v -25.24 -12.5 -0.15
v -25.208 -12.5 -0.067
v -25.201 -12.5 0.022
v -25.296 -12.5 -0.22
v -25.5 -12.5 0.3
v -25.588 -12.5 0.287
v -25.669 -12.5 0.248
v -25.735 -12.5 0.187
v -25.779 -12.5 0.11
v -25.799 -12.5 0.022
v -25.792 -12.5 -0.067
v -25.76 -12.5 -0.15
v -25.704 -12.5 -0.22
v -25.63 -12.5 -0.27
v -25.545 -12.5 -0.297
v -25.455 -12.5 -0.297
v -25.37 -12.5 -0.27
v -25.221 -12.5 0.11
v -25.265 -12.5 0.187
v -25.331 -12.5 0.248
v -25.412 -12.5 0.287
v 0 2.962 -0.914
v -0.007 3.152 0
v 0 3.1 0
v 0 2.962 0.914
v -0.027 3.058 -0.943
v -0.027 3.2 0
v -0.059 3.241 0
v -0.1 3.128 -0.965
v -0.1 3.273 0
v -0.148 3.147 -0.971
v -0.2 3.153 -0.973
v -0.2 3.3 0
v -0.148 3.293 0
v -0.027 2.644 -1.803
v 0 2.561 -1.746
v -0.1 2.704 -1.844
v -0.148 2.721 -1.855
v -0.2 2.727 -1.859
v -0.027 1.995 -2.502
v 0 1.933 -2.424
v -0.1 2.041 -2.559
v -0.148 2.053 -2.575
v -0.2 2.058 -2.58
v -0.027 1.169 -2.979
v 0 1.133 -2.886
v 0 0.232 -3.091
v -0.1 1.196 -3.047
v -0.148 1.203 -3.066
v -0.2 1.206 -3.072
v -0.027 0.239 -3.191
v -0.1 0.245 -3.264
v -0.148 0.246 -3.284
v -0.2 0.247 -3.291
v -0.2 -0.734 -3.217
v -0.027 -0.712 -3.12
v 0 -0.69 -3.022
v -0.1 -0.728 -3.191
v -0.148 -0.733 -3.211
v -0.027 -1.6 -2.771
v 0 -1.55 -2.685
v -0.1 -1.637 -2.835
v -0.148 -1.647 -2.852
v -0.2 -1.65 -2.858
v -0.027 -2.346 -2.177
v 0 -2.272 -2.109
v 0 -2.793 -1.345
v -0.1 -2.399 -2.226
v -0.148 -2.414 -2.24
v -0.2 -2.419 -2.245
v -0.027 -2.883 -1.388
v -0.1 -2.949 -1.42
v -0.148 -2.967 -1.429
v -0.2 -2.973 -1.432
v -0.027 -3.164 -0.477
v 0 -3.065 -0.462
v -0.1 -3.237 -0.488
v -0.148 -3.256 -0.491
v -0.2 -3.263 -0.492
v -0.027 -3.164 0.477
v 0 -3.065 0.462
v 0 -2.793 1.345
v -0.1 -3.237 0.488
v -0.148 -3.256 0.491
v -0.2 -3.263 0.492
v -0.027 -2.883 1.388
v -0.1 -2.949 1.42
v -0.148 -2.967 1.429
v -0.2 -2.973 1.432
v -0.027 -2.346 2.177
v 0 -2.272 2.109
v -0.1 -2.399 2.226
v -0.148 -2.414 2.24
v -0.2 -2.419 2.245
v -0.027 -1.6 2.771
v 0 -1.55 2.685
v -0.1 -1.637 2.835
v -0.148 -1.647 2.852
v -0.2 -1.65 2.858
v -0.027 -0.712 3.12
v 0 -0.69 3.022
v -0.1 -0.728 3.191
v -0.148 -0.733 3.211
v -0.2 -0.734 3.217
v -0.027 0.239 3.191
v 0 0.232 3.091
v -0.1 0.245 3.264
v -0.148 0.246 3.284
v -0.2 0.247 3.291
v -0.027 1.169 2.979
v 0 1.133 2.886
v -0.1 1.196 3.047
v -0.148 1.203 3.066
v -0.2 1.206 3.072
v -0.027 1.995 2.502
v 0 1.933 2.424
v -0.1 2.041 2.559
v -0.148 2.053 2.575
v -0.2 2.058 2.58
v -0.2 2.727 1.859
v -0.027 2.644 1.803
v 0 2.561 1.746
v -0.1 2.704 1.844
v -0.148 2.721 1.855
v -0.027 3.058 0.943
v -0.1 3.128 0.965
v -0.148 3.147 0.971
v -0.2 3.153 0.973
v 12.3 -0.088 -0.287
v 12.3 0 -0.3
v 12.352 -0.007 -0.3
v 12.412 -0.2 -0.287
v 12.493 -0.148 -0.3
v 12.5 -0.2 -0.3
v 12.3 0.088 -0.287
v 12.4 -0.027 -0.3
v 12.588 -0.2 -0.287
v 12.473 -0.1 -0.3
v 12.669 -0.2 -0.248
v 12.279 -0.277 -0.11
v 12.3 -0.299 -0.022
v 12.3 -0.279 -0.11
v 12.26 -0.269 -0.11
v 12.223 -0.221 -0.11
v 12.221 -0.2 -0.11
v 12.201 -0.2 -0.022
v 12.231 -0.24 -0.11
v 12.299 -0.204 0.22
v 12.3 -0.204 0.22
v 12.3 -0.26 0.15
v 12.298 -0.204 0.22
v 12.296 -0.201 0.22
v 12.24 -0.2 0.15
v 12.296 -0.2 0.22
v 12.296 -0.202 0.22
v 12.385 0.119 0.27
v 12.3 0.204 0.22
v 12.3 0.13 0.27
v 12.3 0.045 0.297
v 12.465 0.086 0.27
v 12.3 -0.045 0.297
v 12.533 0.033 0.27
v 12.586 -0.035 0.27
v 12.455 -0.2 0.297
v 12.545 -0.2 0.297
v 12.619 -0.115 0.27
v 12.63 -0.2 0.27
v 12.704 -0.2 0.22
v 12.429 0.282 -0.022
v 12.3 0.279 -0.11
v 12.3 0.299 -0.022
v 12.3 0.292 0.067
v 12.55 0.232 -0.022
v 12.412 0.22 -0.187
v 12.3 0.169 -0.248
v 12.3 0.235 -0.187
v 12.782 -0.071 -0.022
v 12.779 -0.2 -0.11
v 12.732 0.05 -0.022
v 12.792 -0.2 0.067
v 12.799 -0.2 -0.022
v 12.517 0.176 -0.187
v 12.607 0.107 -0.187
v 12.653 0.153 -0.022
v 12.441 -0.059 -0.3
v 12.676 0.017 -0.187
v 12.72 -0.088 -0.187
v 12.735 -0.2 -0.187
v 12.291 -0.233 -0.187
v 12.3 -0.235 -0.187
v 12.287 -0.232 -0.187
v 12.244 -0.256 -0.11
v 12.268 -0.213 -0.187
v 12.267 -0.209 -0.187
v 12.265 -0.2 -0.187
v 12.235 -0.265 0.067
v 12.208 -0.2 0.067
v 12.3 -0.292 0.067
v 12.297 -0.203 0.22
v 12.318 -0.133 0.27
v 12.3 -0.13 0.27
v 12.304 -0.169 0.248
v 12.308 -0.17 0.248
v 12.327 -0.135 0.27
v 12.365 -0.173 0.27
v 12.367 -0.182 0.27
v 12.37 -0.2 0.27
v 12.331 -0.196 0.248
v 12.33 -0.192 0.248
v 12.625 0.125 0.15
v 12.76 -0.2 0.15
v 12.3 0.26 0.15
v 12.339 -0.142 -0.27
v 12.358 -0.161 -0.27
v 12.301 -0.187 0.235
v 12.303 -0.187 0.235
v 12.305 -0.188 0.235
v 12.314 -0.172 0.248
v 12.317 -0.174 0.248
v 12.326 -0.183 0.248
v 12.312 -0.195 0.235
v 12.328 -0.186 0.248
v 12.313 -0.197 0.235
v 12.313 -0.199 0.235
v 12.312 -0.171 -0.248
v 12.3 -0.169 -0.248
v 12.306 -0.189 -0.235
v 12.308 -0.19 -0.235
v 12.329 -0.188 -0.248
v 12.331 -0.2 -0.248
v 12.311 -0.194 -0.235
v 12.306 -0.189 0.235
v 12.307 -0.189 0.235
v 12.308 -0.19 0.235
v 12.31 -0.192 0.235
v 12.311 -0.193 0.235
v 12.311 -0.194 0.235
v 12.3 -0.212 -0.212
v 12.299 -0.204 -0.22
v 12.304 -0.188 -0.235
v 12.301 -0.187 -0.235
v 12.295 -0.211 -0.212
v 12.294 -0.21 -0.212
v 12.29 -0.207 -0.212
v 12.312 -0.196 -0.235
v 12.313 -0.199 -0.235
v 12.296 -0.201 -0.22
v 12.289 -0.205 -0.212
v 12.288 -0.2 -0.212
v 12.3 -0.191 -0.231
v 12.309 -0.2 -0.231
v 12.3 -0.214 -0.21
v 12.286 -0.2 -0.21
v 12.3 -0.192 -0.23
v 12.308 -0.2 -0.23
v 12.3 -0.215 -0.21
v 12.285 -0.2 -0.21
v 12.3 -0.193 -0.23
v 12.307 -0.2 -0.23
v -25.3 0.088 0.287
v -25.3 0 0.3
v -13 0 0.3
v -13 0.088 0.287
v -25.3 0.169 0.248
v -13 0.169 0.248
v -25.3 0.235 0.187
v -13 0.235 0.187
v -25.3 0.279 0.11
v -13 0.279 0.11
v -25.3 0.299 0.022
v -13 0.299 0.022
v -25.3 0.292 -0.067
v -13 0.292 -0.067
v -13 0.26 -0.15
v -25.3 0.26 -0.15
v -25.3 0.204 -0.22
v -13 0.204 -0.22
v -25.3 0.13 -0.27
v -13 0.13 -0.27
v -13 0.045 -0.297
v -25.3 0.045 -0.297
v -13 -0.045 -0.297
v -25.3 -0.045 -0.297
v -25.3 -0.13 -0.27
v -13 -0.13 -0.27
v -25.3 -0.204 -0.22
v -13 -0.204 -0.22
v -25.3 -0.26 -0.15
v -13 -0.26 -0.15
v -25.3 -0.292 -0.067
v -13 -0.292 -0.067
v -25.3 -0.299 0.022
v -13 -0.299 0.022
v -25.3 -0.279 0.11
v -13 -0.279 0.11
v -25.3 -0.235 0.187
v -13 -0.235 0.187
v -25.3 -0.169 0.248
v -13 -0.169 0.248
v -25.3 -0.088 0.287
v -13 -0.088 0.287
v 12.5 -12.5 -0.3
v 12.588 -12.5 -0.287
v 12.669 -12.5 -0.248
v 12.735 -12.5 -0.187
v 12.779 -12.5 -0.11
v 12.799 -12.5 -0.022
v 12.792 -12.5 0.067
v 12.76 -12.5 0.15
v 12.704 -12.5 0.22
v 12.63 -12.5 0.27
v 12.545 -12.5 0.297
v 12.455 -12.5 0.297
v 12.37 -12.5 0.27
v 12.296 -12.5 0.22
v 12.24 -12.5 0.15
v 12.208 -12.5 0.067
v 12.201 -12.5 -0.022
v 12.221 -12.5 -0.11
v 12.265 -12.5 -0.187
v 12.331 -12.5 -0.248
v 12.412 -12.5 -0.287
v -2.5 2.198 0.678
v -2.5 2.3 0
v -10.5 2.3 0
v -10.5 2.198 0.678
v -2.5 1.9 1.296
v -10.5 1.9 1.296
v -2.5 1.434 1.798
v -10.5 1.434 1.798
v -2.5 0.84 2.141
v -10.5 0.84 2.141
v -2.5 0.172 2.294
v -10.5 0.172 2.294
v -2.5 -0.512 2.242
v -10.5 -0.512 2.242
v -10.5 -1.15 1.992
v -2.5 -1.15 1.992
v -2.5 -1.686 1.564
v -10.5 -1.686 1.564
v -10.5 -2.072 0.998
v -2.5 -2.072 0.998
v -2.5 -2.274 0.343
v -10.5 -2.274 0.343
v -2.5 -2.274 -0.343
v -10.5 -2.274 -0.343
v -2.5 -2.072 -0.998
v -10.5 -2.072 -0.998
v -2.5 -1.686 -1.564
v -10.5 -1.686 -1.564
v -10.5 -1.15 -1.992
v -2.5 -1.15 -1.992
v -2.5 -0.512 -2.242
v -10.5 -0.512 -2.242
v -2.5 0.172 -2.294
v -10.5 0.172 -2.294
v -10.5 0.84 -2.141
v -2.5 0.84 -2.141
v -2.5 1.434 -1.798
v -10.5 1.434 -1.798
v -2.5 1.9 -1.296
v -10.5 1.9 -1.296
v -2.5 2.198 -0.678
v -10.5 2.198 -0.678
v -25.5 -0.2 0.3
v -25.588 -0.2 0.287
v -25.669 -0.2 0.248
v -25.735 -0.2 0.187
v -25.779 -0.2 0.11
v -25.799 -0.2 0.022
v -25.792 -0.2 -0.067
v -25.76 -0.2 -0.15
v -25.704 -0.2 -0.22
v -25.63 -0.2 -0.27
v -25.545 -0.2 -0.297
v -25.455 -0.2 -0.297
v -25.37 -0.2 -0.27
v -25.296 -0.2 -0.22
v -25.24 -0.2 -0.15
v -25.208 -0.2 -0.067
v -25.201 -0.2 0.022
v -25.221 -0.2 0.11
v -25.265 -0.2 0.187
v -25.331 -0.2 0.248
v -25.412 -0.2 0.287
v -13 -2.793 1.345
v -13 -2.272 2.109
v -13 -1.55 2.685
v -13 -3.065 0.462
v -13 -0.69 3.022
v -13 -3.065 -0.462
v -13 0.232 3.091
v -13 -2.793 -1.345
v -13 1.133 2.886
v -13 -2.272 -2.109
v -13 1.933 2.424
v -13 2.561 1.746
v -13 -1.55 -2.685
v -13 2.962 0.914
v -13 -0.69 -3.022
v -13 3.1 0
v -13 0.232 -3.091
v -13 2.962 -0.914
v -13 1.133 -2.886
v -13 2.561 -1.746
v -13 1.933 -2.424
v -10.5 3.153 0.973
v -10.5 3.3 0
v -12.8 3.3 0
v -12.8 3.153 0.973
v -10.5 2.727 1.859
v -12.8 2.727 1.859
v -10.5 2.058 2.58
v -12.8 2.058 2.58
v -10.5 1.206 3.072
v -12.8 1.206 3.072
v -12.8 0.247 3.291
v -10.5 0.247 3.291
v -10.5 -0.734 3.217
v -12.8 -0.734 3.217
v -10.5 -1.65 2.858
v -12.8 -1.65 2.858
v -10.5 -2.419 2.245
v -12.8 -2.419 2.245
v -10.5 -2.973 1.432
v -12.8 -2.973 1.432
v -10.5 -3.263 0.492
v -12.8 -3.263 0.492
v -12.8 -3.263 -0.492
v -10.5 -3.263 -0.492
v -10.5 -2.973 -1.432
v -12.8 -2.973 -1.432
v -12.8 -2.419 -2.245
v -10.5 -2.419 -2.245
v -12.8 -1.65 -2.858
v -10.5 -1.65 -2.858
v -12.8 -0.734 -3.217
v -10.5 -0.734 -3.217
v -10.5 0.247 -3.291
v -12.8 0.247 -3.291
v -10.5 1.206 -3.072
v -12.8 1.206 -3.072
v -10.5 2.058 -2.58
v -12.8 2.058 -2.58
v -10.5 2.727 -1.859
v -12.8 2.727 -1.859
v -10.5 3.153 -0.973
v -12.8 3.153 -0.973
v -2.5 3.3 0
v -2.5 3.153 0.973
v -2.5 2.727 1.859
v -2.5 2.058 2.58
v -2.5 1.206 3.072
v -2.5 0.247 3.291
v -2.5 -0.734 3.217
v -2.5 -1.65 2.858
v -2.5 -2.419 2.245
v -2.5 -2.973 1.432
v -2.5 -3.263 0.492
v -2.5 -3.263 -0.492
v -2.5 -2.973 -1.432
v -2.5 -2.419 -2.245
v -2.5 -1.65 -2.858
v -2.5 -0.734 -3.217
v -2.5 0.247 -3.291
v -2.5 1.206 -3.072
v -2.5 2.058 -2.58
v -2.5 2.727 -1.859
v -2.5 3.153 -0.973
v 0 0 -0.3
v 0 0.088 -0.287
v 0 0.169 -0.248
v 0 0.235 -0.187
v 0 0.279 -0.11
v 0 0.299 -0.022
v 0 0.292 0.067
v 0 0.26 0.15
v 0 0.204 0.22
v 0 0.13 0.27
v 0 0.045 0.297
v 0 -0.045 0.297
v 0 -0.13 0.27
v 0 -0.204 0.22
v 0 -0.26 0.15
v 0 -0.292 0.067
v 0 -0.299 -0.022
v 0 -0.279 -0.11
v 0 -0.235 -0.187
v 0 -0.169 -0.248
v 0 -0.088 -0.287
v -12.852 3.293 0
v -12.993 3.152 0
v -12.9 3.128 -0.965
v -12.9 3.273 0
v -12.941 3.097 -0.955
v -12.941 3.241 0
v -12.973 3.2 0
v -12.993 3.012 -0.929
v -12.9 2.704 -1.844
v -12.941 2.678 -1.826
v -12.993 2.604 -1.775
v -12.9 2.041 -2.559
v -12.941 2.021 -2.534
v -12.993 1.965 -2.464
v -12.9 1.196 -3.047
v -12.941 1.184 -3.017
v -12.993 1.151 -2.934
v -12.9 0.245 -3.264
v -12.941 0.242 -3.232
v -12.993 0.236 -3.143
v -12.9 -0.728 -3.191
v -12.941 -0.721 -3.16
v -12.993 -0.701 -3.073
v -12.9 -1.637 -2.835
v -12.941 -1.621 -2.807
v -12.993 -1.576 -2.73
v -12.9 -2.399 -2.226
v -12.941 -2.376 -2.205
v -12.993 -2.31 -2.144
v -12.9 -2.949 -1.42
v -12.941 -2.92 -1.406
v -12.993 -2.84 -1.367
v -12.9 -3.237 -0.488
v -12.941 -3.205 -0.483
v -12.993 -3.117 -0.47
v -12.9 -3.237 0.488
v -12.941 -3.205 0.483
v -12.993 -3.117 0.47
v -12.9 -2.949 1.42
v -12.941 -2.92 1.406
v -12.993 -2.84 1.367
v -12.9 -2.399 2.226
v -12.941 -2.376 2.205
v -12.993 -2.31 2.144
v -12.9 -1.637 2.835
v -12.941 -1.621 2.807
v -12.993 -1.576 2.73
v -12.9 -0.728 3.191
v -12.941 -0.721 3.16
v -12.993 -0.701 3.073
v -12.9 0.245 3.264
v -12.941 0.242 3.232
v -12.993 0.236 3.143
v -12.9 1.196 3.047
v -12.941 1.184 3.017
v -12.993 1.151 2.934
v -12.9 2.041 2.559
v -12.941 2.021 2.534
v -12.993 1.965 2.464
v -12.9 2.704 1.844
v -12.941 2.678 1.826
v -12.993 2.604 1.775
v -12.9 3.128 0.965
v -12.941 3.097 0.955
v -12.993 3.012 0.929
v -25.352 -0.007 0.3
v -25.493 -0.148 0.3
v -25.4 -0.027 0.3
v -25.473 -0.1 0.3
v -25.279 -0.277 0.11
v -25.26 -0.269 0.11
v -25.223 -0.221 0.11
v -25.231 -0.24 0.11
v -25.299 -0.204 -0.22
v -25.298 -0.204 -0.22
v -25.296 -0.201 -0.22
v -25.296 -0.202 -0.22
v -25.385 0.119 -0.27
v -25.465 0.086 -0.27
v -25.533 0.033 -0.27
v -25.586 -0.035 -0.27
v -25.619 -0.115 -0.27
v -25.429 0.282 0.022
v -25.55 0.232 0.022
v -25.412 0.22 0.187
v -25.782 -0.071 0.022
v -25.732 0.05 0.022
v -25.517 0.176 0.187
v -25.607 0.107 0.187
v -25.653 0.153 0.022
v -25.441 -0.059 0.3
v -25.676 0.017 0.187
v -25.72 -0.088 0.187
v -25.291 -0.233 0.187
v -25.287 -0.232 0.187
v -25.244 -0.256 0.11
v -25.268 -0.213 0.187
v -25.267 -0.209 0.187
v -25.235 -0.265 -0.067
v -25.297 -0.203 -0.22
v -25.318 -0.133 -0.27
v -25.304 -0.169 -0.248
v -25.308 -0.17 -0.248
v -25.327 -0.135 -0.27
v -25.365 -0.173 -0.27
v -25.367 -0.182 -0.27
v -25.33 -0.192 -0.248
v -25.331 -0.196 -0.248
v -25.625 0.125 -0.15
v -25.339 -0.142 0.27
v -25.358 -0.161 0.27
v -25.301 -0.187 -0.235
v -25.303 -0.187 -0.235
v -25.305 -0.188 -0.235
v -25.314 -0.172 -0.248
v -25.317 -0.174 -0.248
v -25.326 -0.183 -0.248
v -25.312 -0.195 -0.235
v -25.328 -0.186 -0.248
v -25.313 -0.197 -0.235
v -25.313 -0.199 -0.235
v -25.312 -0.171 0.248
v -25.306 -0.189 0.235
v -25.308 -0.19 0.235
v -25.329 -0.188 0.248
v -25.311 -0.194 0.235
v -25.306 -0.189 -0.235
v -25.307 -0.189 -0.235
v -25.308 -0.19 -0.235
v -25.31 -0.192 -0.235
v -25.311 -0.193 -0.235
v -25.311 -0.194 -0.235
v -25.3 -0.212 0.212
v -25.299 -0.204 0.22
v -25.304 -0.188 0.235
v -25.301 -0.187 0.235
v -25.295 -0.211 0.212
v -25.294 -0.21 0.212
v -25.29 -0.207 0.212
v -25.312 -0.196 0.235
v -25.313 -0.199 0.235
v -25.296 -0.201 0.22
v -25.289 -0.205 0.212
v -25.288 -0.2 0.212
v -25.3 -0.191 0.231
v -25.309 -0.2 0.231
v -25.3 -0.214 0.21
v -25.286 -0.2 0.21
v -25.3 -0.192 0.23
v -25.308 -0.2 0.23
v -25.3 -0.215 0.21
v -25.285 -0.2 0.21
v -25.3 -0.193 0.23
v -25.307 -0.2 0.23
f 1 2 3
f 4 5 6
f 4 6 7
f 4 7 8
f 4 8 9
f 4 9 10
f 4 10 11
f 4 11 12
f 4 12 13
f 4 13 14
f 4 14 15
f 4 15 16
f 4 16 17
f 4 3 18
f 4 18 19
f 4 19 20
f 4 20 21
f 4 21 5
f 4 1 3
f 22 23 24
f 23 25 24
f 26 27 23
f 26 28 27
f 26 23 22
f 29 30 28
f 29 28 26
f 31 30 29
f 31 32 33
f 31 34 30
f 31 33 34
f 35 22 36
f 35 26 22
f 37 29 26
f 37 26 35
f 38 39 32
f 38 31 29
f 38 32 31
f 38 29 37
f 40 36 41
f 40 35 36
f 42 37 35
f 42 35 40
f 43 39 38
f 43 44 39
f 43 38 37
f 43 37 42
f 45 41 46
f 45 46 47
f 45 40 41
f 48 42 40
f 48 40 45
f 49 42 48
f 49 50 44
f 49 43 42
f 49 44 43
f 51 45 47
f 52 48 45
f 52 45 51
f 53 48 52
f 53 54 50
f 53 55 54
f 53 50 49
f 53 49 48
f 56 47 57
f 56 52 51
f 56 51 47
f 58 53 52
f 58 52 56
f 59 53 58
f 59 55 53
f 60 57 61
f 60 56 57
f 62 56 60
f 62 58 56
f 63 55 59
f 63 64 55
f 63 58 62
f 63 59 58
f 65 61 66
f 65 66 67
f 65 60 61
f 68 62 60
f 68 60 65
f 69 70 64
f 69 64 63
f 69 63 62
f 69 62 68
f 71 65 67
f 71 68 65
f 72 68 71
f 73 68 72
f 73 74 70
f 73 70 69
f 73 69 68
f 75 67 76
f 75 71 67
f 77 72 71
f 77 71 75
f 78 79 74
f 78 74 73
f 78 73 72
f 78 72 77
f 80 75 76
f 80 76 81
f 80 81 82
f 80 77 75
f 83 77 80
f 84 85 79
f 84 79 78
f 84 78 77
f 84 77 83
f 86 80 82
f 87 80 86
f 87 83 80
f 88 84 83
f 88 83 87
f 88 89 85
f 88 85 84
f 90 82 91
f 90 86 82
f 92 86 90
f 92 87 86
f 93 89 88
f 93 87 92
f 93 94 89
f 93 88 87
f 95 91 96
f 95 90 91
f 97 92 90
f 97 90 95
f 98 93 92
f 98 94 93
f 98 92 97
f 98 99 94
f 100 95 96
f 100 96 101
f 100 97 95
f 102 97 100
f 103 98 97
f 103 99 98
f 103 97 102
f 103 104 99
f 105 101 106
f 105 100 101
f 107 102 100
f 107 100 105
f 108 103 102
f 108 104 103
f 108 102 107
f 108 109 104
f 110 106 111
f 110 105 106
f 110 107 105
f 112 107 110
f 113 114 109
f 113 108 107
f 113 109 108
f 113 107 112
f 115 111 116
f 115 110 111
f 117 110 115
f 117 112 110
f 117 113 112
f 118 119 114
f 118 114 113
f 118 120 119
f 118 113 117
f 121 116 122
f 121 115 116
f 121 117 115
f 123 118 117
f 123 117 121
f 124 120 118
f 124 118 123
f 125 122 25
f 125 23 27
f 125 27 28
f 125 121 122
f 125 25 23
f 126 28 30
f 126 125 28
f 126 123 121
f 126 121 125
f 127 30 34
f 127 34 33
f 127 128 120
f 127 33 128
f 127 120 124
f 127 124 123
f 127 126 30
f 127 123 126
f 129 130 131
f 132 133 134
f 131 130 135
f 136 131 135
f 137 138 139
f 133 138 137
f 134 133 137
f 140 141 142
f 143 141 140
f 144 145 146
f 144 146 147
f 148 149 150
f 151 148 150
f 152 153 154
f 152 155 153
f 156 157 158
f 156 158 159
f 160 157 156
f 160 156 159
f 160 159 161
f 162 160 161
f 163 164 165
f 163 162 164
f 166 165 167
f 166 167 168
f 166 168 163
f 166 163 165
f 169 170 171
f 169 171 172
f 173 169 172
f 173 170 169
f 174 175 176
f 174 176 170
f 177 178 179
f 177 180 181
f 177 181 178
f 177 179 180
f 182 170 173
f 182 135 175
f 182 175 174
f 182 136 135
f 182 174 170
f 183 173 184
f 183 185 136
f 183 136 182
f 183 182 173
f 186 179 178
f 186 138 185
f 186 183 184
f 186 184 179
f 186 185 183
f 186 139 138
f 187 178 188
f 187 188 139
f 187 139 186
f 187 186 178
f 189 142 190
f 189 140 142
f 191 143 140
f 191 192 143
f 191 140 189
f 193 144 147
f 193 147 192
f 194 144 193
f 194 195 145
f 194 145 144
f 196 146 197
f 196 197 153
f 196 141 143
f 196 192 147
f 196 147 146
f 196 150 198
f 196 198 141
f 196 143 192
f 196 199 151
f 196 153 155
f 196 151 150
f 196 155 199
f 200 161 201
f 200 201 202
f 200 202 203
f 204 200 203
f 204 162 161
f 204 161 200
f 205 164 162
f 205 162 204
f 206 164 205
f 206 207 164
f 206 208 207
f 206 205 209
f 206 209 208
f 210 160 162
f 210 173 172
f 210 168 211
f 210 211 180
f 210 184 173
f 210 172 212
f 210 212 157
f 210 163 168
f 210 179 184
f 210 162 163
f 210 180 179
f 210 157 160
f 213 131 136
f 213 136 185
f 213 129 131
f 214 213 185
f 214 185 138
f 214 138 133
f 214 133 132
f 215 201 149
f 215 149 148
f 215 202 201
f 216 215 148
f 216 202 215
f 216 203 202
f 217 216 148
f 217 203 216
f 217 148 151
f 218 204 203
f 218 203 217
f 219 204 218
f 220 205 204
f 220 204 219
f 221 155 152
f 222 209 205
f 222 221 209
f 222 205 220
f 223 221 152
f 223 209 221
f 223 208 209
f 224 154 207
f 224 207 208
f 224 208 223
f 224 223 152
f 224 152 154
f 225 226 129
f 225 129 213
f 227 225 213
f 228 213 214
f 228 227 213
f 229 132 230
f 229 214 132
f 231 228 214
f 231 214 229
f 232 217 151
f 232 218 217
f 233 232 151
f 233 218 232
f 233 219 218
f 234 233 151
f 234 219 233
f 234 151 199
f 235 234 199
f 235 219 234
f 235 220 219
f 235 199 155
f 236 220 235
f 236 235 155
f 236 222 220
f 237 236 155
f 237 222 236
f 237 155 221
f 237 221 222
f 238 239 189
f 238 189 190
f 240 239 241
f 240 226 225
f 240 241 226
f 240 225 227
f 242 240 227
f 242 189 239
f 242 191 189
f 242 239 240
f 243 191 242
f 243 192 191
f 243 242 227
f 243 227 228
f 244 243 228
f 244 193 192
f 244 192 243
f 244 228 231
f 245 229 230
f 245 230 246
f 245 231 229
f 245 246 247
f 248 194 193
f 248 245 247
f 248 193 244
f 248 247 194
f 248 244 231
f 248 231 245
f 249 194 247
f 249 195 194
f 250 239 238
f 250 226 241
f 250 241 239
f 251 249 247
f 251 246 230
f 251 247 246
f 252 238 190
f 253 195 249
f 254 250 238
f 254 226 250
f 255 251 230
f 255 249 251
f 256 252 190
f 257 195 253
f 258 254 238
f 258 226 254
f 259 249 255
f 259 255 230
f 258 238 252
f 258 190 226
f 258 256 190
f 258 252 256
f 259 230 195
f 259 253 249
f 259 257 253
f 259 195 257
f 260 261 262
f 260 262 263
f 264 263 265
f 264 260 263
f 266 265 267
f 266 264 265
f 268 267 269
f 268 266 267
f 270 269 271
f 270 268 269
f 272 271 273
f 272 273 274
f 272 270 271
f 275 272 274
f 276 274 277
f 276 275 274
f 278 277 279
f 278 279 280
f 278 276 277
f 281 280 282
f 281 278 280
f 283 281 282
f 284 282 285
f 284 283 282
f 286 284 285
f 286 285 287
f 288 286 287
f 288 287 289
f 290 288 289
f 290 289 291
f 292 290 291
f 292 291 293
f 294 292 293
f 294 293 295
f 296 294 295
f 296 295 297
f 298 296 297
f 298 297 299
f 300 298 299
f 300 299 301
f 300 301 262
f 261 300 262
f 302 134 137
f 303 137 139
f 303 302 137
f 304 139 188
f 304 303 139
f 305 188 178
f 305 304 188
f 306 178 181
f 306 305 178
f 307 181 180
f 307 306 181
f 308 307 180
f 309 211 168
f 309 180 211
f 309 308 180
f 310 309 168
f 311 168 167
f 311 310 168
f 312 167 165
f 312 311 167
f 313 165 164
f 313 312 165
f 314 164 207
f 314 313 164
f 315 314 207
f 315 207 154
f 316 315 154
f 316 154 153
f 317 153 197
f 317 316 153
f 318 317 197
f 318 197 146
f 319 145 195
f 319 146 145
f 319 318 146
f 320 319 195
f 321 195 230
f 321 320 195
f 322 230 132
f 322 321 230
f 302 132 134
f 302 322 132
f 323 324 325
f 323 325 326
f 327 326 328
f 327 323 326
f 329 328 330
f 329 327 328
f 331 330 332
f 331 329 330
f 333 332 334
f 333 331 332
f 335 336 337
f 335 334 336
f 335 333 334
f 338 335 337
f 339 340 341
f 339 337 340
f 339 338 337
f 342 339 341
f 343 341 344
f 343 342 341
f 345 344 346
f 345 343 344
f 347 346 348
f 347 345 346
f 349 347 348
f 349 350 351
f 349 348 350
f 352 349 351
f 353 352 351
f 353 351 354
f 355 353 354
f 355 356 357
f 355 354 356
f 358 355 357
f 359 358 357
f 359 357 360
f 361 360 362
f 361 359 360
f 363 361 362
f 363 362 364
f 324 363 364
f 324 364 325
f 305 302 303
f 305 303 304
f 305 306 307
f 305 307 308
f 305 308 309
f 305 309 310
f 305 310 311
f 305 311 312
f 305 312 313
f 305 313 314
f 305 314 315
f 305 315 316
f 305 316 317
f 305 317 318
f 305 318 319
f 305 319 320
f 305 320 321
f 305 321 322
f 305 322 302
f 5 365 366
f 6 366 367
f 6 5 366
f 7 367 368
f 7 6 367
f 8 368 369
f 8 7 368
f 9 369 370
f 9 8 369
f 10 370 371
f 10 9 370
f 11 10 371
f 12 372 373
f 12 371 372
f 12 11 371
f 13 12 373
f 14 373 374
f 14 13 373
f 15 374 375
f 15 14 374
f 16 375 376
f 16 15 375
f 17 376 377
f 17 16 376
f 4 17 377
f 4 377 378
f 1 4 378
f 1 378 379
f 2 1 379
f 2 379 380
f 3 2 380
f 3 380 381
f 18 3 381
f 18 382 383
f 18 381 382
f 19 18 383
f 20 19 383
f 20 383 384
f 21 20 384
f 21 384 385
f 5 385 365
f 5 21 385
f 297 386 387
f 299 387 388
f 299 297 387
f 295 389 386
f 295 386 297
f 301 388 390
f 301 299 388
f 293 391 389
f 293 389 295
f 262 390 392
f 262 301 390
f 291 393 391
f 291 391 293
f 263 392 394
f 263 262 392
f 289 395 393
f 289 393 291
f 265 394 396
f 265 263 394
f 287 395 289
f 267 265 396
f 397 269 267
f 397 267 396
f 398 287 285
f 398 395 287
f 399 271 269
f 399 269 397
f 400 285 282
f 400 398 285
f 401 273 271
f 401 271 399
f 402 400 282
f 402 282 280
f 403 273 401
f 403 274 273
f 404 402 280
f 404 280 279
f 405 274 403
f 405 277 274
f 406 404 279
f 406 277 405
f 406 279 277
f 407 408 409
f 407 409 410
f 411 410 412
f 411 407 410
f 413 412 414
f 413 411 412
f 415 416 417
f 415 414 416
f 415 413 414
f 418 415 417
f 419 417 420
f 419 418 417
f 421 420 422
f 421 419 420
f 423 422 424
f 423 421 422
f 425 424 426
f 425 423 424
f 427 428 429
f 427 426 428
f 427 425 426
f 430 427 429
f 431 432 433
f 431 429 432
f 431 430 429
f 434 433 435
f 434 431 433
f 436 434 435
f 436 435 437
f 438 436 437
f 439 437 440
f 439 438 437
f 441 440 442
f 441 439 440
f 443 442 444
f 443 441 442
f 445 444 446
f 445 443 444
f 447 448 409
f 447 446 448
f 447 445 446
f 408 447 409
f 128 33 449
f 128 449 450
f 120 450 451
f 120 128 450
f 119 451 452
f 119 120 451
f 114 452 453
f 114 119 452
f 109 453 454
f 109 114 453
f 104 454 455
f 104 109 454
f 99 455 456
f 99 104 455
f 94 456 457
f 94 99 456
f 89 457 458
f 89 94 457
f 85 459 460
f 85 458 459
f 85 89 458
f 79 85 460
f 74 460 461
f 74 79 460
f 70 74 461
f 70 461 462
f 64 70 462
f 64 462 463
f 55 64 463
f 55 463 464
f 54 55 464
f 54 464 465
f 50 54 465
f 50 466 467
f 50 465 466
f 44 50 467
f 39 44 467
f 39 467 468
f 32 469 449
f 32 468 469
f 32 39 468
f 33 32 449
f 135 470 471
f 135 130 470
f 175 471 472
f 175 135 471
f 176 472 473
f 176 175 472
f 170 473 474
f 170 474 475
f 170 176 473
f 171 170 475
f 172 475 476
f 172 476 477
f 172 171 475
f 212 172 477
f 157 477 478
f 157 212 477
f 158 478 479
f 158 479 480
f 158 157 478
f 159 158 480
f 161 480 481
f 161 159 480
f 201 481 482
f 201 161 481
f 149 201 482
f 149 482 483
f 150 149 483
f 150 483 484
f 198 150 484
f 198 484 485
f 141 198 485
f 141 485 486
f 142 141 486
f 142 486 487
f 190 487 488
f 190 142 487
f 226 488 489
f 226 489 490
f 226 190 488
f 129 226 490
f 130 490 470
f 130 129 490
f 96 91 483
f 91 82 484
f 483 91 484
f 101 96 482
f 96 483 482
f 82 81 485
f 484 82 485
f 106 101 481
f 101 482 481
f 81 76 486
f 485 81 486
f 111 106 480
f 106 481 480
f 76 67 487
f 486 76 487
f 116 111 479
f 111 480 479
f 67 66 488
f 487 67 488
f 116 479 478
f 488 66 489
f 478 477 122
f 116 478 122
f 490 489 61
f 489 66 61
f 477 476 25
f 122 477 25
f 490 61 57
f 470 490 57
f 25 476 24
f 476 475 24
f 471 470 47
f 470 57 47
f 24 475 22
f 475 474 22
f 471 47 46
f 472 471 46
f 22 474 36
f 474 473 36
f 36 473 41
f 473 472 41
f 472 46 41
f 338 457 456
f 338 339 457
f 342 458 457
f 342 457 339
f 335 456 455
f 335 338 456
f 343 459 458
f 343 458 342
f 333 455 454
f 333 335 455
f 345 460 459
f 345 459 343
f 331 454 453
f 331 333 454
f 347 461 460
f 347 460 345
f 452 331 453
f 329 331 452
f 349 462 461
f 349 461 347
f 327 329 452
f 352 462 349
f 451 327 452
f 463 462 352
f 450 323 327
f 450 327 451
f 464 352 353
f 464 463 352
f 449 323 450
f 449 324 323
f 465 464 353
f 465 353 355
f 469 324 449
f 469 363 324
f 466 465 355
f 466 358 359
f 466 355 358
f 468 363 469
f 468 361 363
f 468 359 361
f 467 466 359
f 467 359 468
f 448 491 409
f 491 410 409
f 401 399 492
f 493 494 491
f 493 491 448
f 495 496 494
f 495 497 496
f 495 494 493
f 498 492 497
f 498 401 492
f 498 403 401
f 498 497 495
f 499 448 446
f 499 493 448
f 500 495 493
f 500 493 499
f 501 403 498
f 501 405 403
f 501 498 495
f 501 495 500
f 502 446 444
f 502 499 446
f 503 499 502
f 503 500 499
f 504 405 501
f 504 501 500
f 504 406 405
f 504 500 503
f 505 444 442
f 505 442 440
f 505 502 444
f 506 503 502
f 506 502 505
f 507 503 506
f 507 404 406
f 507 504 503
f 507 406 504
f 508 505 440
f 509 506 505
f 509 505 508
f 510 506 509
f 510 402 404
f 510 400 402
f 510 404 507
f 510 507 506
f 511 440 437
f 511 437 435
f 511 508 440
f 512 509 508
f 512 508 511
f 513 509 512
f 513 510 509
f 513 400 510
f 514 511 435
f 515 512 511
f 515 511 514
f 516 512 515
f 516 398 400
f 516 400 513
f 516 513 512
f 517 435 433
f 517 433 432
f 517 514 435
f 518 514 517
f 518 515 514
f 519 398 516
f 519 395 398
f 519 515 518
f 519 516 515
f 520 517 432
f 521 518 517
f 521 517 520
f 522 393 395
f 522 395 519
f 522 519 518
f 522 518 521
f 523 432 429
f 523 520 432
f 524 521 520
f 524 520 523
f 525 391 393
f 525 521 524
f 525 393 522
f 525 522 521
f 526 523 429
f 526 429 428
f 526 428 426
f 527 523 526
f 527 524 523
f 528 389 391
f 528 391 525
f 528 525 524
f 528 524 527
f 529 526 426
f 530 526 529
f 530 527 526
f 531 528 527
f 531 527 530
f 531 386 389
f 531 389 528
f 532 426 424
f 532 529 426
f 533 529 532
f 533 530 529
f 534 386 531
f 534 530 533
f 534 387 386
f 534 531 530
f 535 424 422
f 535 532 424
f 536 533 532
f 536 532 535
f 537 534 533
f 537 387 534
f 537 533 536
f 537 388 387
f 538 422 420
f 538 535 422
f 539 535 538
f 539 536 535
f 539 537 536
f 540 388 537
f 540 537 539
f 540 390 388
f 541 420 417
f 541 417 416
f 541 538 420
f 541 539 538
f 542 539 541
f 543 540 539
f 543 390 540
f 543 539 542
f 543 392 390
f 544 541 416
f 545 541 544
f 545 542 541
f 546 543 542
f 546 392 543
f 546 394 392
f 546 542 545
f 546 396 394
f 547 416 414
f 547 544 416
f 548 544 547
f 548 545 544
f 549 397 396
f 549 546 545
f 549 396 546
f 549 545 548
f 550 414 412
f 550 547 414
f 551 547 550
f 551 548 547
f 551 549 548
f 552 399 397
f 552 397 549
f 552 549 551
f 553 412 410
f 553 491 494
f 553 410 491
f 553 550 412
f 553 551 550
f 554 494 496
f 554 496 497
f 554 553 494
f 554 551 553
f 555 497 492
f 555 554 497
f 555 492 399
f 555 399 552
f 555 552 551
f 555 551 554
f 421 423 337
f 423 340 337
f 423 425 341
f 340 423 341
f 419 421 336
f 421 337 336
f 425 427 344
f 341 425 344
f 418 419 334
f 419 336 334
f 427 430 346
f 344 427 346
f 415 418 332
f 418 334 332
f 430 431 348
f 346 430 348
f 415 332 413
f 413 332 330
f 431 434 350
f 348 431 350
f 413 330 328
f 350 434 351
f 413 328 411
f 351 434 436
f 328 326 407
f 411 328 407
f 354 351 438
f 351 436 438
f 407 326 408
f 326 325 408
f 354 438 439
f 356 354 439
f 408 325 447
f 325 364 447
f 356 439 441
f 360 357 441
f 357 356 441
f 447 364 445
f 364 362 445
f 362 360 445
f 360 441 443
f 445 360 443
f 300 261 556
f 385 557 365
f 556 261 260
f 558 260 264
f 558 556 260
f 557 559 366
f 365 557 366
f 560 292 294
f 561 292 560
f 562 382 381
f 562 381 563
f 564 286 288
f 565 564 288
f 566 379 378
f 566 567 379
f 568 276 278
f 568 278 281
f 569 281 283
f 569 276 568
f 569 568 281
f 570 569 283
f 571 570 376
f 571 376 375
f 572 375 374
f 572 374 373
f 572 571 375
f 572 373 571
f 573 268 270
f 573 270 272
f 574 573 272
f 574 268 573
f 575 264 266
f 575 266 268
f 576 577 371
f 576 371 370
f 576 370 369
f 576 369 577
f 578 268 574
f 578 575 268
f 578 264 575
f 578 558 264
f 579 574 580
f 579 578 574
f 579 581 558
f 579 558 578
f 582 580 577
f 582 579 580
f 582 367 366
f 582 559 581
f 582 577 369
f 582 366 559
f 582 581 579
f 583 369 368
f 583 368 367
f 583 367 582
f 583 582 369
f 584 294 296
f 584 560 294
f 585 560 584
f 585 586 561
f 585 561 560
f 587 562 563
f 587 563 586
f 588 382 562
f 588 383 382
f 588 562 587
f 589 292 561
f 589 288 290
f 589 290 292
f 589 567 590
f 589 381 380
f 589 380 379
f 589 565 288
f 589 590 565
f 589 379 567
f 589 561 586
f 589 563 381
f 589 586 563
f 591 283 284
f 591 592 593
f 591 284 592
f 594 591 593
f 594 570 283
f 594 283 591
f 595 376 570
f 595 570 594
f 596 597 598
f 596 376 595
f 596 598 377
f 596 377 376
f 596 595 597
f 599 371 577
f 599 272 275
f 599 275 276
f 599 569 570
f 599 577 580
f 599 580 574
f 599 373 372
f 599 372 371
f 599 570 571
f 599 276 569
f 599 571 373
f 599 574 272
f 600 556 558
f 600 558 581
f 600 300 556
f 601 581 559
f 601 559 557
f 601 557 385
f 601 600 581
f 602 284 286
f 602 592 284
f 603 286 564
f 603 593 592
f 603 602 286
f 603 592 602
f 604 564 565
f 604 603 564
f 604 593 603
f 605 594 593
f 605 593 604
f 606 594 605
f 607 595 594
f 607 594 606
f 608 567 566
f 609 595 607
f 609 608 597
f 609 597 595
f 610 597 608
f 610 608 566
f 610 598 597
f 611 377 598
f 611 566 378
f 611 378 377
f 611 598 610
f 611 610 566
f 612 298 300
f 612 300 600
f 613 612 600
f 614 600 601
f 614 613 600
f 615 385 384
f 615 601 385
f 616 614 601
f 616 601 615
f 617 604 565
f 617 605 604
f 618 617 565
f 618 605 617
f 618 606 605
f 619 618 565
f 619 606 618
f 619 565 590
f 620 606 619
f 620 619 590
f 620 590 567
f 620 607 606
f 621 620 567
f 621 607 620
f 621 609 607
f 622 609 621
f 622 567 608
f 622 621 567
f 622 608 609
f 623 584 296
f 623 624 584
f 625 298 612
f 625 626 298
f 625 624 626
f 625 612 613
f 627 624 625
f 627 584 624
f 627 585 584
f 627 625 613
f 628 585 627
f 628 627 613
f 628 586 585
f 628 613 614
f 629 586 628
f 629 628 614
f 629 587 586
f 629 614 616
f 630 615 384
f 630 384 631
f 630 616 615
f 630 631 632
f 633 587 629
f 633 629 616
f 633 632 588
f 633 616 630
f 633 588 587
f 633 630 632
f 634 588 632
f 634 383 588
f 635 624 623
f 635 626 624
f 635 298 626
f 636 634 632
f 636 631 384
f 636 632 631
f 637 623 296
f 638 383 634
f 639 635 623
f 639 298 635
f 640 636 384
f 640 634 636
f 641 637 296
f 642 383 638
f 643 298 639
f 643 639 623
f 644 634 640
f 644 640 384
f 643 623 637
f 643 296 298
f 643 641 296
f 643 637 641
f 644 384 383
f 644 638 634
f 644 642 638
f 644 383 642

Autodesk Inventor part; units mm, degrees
ref_plane "YZ Plane" through (0, 0, 0) normal (1, 0, 0) x (0, 1, 0)
ref_plane "XZ Plane" through (0, 0, 0) normal (0, 1, 0) x (-1, 0, 0)
ref_plane "XY Plane" through (0, 0, 0) normal (0, 0, 1) x (1, 0, 0)
sketch "Sketch1" plane through (0, 0, 0) normal (0, 0, 1) x (1, 0, 0)
  line L0 (0, 0) -> (-13, 0)
  line L1 (-13, 0) -> (-13, 3.1)
  line L2 (-12.8, 3.3) -> (-10.5, 3.3)
  line L3 (-10.5, 3.3) -> (-10.5, 2.3)
  line L4 (-10.5, 2.3) -> (-2.5, 2.3)
  line L5 (-2.5, 2.3) -> (-2.5, 3.3)
  line L6 (-2.5, 3.3) -> (-0.2, 3.3)
  line L7 (0, 3.1) -> (0, 0)
  arc A0 (-12.8, 3.3) -> (-13, 3.1) centre (-12.8, 3.1) ccw
  arc A1 (0, 3.1) -> (-0.2, 3.3) centre (-0.2, 3.1) ccw
  line L8 (-10.5, 2.3) -> (-10.5, 0)
  line L9 (-2.5, 2.3) -> (-2.5, 0)
  point P0 (-13, 3.3)
  point P1 (0, 3.3)
  dimension "d0" = 13
  dimension "d1" = 3.3
  dimension "d2" = 2.5
  dimension "d3" = 1
  dimension "d5" = 8
  dimension "d6" = 1
  dimension "d7" = 2.5
  dimension "d8" = 0.2
revolve "Revolution1" add sketch "Sketch1" angle 360 about axis through (0, 0, 0) along (-1, 0, 0)
ref_plane "Work Plane1" through (0, 0, 0) normal (1, 0, 0) x (0, 0, -1)
sketch "Sketch2" plane through (0, 0, 0) normal (1, 0, 0) x (0, 0, -1)
  circle A0 centre (0, 0) radius 0.3
  dimension "d11" = 0.6
sketch "Sketch3" plane through (0, 0, 0) normal (0, 0, 1) x (1, 0, 0)
  line L0 (0, 0) -> (12.3, 0)
  line L1 (12.5, -0.2) -> (12.5, -12.5)
  arc A0 (12.5, -0.2) -> (12.3, 0) centre (12.3, -0.2) ccw
  point P0 (12.5, 0)
  dimension "d12" = 12.5
  dimension "d13" = 12.5
  dimension "d14" = 0.2
sweep "Sweep1" add profiles "Sketch2" path "Sketch3"
ref_plane "Work Plane2" through (-13, 0, 0) normal (-1, 0, 0) x (0, 0, 1)
sketch "Sketch4" plane through (-13, 0, 0) normal (-1, 0, 0) x (0, 0, 1)
  circle A0 centre (0, 0) radius 0.3 projected
  circle A1 centre (0, 0) radius 0.3
  point P0 (0, 0)
  dimension "d18" = 0.6
sketch "Sketch5" plane through (0, 0, 0) normal (0, 0, 1) x (1, 0, 0)
  line L0 (-13, 3.1) -> (-13, -3.1) projected
  line L1 (-13, 0) -> (-25.3, 0)
  line L2 (-25.5, -0.2) -> (-25.5, -12.5)
  arc A0 (-25.3, 0) -> (-25.5, -0.2) centre (-25.3, -0.2) ccw
  point P0 (0, 0)
  point P1 (-25.5, 0)
  dimension "d19" = 12.5
  dimension "d20" = 12.5
  dimension "d21" = 0.2
sweep "Sweep2" add profiles "Sketch4" path "Sketch5" path curves L1 A0 L2
equation "\"BendRadius\" = Thickness"
equation "\"BendReliefWidth\" = Thickness"
equation "\"BendReliefDepth\" = 0.5 * Thickness"
equation "\"CornerReliefSize\" = 4 * Thickness"
equation "\"MinimumRemnant\" = 2 * Thickness"
equation "\"TransitionRadius\" = BendRadius"
equation "\"JacobiRadiusSize\" = BendRadius"
equation "\"GapSize\" = Thickness"
equation "\"Thickness\" = 3.048"
properties part number "A44"
